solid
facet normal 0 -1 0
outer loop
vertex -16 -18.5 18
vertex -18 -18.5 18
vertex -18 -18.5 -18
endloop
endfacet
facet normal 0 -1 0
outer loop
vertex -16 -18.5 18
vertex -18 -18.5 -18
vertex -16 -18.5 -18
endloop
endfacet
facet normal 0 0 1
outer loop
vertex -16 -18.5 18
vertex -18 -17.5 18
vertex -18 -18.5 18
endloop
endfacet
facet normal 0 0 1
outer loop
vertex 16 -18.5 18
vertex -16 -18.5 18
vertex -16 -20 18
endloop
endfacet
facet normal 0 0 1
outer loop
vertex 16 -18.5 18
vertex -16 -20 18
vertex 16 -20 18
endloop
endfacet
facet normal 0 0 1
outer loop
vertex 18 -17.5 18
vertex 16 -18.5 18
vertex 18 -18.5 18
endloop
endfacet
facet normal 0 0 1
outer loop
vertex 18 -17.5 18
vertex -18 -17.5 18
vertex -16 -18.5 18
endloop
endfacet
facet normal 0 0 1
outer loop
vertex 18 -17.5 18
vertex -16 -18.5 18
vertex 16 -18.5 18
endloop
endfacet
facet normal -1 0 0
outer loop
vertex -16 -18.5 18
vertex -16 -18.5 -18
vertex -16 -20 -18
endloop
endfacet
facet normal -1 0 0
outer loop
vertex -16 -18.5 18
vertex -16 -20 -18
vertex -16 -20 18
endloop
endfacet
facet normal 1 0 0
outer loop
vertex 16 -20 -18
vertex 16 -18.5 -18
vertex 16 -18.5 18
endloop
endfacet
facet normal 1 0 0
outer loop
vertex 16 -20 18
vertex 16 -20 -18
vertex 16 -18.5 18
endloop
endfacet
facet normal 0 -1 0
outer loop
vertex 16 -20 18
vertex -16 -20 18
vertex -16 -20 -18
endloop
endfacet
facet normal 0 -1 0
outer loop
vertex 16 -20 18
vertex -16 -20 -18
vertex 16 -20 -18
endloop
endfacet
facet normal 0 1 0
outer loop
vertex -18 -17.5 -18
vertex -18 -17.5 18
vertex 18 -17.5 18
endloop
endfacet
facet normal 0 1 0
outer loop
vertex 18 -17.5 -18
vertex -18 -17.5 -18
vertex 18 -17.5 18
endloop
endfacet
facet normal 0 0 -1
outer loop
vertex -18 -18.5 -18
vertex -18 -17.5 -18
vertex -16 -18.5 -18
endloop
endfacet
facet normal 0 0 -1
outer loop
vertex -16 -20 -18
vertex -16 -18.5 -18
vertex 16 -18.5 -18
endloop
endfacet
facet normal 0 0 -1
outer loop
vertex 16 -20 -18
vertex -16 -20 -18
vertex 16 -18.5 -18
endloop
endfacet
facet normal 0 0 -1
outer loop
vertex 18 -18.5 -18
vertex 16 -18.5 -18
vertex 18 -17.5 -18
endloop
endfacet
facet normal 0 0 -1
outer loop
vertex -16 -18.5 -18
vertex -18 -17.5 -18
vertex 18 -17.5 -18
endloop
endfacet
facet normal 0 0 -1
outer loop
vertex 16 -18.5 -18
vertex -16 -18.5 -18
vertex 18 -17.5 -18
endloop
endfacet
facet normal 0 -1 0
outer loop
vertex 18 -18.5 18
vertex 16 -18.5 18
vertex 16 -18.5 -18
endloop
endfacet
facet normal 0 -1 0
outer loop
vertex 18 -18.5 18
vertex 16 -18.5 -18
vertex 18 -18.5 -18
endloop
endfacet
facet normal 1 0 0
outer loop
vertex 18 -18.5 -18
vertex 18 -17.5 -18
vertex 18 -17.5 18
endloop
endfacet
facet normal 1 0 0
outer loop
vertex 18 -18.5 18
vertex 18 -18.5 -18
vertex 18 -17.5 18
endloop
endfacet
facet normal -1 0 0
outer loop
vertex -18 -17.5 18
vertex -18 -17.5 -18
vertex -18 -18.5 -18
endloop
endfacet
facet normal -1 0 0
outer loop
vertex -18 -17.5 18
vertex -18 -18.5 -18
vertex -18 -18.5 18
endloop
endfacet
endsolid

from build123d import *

# Parameters (mm, degrees)
SKETCH017_W               = 32
SKETCH017_H               = 36
EXTRUDE015_DEPTH          = 1.5
SKETCH016_W               = 36
SKETCH016_H               = 36
EXTRUDE014_DEPTH          = 1
FUSION009_PLACEMENT_ANGLE = 90


with BuildPart() as extrude015:
    # Sketch017 (on Face6 of Extrude014) → Extrude015 (new body)
    with BuildSketch(Plane.XY.offset(1)):
        Rectangle(SKETCH017_W, SKETCH017_H)
    extrude(amount=EXTRUDE015_DEPTH)


with BuildPart() as fusion009:
    # Sketch016 → Extrude014 (new body)
    with BuildSketch(Plane.XY):
        Rectangle(SKETCH016_W, SKETCH016_H)
    extrude(amount=EXTRUDE014_DEPTH)

    # Fusion009: union Extrude015
    add(extrude015.part)


with BuildPart() as fusion009_1:
    # Fusion009 placement: moved
    add(fusion009.part.moved(Location((0, -17.5, 0))).rotate(Axis((0, -17.5, 0), (1, 0, 0)), FUSION009_PLACEMENT_ANGLE))


solid = fusion009_1.part
